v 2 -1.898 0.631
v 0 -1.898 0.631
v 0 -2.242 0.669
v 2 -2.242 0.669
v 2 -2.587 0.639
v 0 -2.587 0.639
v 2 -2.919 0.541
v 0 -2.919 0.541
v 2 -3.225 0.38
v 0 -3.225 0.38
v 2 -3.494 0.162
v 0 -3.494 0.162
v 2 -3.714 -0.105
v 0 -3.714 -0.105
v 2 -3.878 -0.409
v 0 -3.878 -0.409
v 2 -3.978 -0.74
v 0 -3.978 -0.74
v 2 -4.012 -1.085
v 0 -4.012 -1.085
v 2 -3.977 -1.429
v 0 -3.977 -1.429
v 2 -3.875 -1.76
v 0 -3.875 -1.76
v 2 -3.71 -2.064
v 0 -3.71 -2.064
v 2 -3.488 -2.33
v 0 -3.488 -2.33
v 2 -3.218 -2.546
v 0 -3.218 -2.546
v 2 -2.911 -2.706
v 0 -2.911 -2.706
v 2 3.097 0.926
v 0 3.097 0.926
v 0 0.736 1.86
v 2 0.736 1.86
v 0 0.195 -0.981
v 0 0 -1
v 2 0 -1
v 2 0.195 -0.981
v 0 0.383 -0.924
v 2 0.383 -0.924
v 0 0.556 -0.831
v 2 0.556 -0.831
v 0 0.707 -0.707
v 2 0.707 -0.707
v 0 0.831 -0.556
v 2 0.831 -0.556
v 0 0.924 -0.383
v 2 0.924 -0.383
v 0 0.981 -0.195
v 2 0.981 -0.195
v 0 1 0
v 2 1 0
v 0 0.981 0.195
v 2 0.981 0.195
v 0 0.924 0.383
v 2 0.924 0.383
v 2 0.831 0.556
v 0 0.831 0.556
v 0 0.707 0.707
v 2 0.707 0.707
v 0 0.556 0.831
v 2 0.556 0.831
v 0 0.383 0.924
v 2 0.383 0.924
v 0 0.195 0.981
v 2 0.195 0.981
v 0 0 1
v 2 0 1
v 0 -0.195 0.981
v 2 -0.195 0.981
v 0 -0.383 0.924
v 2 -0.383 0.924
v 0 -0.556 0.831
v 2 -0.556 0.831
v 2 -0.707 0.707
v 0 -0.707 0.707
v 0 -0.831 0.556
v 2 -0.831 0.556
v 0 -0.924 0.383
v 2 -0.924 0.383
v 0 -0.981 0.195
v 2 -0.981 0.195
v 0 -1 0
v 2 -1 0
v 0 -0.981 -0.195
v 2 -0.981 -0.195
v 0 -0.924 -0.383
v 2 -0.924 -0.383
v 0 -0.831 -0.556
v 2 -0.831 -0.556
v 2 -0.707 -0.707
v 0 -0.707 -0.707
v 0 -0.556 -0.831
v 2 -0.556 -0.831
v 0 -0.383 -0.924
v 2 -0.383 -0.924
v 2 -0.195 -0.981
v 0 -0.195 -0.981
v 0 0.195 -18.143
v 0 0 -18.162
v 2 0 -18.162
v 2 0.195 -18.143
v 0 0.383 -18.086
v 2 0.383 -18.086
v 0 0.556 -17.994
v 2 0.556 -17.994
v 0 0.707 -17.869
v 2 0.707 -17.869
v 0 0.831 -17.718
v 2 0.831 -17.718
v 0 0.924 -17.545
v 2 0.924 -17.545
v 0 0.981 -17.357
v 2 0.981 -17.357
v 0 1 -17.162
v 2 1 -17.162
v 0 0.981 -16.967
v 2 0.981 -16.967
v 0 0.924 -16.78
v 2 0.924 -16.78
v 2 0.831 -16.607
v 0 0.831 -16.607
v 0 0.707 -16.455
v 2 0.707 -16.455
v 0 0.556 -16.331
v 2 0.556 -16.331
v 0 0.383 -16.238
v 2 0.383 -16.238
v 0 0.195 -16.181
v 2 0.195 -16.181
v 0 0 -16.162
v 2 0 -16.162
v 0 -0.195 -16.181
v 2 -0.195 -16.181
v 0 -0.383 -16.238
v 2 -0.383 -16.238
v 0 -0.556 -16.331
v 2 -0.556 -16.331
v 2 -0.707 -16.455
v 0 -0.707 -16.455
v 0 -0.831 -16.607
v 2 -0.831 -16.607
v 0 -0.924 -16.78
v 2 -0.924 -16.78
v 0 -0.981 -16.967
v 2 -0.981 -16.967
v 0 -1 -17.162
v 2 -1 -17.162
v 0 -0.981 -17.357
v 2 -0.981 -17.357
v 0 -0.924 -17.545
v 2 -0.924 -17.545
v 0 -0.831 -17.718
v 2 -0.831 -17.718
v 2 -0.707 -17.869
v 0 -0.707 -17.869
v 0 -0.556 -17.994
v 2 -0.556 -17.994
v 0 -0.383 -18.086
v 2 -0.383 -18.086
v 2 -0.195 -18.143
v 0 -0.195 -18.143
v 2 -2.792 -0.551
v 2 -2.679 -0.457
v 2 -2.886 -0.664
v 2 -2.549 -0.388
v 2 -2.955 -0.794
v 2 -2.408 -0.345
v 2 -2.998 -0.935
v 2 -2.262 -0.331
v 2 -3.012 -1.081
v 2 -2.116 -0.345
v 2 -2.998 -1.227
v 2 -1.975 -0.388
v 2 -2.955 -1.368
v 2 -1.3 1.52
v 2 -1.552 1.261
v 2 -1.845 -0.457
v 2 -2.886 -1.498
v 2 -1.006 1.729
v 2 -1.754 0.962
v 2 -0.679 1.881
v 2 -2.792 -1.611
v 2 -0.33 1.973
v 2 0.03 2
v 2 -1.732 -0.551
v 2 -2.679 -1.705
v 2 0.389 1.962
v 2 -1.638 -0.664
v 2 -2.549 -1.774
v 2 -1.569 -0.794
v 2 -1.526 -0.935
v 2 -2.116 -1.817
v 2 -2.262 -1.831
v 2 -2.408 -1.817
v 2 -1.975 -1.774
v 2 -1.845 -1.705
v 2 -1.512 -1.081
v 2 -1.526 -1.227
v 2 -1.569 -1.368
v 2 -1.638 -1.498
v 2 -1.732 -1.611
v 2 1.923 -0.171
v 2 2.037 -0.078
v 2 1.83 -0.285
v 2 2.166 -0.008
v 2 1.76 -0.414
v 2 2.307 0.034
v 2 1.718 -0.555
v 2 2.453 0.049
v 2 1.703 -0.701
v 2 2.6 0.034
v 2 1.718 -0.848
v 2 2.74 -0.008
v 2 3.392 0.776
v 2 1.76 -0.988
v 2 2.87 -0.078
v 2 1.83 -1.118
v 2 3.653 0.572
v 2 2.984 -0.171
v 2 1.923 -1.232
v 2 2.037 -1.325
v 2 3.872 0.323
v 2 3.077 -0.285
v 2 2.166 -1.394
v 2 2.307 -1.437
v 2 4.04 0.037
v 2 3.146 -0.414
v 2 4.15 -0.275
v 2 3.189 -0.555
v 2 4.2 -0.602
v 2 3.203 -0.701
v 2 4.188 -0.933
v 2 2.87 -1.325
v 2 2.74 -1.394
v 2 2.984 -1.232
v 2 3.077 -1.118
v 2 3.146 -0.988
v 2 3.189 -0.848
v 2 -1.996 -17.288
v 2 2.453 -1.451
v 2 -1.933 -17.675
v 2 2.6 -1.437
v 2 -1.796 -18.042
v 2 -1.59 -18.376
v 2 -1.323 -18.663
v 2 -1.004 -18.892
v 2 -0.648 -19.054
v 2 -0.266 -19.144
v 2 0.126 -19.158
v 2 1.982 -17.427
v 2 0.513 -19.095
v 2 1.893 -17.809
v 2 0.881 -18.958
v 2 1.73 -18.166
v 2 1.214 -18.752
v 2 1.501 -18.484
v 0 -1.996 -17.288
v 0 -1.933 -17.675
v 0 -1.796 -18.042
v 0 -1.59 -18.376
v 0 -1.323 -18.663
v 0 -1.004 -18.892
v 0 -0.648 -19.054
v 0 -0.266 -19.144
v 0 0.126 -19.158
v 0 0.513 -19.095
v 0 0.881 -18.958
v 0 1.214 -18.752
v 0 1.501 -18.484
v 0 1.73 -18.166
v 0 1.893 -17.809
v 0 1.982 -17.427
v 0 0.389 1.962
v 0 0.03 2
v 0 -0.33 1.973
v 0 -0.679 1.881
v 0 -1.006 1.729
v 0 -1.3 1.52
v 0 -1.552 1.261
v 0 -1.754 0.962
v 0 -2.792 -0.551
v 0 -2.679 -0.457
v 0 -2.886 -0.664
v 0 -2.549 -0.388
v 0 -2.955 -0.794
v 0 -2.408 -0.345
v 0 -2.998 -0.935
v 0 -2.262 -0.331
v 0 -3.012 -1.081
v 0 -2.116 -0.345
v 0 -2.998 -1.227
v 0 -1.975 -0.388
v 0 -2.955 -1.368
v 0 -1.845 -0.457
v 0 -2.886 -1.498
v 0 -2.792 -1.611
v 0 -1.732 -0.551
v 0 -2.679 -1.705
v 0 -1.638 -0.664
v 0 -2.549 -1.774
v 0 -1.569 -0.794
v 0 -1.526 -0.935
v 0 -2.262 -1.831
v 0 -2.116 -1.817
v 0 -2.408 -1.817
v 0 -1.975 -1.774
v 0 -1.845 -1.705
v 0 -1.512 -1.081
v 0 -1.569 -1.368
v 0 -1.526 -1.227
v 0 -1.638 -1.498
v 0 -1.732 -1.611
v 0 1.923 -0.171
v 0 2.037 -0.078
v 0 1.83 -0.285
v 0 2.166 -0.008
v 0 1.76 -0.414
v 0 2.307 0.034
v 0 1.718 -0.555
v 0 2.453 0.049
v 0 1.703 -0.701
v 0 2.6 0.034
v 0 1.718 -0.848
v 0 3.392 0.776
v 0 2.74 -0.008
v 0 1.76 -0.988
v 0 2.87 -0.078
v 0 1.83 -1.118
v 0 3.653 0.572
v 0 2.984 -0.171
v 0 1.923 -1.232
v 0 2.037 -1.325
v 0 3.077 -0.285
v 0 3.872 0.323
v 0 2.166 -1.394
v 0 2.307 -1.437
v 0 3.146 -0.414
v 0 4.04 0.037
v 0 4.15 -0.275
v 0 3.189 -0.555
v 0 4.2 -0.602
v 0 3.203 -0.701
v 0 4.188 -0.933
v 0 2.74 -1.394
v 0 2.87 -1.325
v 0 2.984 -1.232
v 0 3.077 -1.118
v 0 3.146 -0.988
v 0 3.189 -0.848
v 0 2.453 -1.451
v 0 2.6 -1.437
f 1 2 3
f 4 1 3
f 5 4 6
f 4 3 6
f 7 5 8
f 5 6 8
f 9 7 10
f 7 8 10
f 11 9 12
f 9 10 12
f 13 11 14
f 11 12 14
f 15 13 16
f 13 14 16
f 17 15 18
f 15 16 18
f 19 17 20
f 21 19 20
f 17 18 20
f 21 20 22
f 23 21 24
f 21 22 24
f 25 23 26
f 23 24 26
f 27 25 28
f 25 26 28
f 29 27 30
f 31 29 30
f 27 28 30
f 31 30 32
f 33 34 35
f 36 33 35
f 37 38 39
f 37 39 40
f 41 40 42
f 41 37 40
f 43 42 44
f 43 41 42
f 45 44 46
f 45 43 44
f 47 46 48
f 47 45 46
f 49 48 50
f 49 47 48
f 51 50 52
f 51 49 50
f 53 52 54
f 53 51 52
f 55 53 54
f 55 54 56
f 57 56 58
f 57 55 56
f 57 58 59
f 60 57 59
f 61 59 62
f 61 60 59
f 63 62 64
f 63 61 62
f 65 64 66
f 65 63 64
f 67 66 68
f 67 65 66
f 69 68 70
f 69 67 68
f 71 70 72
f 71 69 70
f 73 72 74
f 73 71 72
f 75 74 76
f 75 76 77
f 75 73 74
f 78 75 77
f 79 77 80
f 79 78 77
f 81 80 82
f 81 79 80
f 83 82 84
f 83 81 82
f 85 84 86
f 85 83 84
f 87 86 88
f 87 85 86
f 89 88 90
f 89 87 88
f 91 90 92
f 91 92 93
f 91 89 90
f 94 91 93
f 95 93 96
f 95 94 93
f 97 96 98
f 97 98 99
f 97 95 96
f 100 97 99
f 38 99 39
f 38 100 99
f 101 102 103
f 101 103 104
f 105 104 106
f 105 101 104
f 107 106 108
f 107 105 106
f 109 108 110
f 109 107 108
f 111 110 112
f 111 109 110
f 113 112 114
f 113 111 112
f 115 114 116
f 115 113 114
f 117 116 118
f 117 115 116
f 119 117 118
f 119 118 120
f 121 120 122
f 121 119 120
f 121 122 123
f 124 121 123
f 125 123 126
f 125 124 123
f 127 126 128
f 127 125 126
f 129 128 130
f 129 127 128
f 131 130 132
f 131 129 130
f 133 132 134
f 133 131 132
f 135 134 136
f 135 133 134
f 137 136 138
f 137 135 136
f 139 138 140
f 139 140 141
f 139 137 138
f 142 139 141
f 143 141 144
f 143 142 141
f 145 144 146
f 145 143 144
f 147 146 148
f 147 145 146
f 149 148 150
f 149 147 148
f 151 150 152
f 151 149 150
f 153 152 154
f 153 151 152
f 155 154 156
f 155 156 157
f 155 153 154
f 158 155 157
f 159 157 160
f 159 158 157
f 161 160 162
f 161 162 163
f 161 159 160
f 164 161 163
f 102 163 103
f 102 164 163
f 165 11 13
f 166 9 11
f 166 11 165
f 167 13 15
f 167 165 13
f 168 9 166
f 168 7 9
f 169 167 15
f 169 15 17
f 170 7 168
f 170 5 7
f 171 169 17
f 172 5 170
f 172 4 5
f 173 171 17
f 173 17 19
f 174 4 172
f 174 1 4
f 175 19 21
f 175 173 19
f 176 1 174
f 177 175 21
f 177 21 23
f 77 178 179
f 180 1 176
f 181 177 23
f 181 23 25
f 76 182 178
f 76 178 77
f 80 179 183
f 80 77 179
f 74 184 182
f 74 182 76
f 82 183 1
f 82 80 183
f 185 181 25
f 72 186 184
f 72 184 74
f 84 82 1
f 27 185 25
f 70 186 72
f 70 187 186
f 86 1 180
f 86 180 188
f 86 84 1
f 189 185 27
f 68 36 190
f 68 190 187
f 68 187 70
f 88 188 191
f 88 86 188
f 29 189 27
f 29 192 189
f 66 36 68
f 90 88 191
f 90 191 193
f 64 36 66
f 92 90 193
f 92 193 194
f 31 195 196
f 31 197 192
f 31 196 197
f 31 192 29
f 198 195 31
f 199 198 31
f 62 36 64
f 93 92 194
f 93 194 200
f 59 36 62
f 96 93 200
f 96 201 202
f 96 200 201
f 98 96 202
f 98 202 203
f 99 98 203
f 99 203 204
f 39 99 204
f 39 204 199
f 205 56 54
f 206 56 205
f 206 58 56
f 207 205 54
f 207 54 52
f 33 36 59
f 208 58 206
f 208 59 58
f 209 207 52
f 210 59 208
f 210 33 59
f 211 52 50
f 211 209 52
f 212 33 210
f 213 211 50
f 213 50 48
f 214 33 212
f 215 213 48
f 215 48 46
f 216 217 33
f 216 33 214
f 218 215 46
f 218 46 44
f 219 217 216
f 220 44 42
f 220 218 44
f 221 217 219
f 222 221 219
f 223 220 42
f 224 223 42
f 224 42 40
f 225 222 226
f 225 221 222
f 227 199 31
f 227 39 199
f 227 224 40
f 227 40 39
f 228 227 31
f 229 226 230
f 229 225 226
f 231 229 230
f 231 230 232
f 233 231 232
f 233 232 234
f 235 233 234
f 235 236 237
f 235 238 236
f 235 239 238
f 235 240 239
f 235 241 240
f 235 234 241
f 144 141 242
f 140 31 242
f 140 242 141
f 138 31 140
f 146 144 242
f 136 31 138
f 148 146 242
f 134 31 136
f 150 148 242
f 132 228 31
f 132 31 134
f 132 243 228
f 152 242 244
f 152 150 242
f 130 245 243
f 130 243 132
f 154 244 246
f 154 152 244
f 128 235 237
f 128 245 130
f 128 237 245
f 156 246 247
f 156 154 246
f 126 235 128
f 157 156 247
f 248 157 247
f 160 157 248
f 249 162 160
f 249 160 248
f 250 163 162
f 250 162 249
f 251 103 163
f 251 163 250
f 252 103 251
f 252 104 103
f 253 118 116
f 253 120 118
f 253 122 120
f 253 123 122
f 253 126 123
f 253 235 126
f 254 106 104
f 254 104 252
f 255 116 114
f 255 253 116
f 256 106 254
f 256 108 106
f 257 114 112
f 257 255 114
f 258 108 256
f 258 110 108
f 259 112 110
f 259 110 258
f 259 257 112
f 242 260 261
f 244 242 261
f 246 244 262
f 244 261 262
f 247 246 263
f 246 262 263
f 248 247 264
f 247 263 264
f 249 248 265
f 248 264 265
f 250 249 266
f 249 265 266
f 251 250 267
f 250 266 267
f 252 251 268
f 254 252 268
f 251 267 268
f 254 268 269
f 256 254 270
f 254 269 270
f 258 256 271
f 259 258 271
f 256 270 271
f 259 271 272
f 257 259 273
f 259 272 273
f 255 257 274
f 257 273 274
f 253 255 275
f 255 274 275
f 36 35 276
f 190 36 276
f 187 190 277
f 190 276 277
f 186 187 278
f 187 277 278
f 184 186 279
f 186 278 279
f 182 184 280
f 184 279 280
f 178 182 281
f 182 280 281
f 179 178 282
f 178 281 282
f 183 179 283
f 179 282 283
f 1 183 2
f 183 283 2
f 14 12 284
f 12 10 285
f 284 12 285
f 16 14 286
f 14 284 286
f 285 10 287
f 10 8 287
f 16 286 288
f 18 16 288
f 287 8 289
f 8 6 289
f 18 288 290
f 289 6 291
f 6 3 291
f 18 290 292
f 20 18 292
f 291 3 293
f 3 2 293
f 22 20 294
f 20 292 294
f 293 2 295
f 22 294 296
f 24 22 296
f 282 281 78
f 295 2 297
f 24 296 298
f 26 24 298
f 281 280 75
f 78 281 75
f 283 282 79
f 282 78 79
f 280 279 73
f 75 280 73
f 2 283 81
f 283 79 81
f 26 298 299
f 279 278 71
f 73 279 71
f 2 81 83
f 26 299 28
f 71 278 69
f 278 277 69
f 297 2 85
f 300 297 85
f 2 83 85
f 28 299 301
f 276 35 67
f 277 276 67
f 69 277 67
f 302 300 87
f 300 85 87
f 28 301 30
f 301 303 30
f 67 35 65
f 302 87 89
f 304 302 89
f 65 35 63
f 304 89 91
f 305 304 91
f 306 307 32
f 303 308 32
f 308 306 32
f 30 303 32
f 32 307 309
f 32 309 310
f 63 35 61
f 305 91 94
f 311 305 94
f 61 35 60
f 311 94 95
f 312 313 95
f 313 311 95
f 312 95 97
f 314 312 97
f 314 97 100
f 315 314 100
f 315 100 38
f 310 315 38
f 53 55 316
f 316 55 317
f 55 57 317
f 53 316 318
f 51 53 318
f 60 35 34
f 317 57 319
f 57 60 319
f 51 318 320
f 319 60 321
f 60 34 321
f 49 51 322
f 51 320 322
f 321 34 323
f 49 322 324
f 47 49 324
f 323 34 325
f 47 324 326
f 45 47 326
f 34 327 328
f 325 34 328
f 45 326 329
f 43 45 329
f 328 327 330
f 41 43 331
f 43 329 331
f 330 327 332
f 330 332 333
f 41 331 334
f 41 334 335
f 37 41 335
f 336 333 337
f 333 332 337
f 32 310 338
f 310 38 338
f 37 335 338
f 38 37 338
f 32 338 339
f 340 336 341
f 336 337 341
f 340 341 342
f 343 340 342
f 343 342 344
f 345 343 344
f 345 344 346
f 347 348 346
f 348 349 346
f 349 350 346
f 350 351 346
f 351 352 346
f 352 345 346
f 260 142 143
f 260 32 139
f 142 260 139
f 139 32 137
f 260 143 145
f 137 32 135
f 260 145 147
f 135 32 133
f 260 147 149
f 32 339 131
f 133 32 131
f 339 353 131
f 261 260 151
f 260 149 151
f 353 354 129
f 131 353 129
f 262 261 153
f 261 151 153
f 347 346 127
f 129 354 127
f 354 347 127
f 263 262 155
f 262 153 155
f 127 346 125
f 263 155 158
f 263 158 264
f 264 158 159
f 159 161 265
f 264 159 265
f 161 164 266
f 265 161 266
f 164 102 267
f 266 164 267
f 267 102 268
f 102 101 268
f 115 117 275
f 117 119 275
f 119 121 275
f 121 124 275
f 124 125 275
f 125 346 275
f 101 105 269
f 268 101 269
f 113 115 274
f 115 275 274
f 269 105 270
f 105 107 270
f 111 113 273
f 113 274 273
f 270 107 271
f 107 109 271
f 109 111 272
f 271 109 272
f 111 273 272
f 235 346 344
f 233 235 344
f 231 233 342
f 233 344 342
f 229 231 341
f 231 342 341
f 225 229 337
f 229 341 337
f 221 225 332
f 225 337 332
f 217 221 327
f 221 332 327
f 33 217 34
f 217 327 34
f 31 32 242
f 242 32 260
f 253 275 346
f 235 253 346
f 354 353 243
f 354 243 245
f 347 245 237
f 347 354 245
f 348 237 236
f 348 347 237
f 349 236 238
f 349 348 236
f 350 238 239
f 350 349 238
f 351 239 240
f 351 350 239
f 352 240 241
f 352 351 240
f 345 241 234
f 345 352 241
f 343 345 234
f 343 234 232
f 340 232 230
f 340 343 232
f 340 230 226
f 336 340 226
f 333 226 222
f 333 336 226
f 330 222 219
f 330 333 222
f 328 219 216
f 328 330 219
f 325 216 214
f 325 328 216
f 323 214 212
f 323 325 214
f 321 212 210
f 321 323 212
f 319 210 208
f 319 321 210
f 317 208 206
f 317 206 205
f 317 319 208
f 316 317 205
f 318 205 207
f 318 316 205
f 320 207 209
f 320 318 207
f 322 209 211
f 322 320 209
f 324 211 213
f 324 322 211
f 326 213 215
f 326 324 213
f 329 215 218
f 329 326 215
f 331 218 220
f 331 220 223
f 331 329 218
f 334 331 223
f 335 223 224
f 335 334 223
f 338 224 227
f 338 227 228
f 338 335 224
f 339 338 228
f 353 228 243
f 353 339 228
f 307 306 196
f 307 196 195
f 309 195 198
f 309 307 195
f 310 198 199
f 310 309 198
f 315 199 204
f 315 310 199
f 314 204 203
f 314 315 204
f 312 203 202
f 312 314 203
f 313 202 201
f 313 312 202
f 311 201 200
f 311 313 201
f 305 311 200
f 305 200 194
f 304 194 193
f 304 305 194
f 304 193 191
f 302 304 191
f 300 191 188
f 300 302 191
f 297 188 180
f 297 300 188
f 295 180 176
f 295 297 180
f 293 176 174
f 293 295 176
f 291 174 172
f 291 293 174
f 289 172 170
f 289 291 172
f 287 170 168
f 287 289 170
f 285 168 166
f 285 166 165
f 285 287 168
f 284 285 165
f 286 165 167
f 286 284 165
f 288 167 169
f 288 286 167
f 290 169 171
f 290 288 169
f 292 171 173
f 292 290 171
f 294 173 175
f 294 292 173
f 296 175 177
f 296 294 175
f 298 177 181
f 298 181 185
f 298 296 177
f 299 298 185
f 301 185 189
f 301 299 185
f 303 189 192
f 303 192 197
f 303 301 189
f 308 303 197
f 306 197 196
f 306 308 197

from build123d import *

# Parameters (mm, degrees)
SKETCH1_R           = 1
SKETCH1_R_2         = 0.75
BOSS_EXTRUDE1_DEPTH = 2


with BuildPart() as part:
    # Sketch1 → Boss-Extrude1 (new body)
    with BuildSketch(Plane(origin=(0, 0, 0), x_dir=(0, 0, -1), z_dir=(1, 0, 0))):
        with BuildLine():
            Line((2.706030377, -2.911399365), (17.287509609, -1.996071114))
            ThreePointArc((17.287509609, -1.996071114), (19.160976512, -0.070218298), (17.427275011, 1.982357258))
            Line((17.427275011, 1.982357258), (0.933331362, 4.187799716))
            ThreePointArc((0.933331362, 4.187799716), (-0.184232683, 3.962593396), (-0.925951299, 3.096844717))
            Line((-0.925951299, 3.096844717), (-1.859829004, 0.735551545))
            ThreePointArc((-1.859829004, 0.735551545), (-1.812327837, -0.845853303), (-0.63071828, -1.897944797))
            ThreePointArc((-0.63071828, -1.897944797), (0.572431558, -3.93640053), (2.706030377, -2.911399365))
        make_face()
        Circle(SKETCH1_R, mode=Mode.SUBTRACT)
        with Locations((17.162209545, 0)):
            Circle(SKETCH1_R, mode=Mode.SUBTRACT)
        with Locations((0.701399079, 2.453237115)):
            Circle(SKETCH1_R_2, mode=Mode.SUBTRACT)
        with Locations((1.081010079, -2.261931096)):
            Circle(SKETCH1_R_2, mode=Mode.SUBTRACT)
    extrude(amount=BOSS_EXTRUDE1_DEPTH)


solid = part.part
